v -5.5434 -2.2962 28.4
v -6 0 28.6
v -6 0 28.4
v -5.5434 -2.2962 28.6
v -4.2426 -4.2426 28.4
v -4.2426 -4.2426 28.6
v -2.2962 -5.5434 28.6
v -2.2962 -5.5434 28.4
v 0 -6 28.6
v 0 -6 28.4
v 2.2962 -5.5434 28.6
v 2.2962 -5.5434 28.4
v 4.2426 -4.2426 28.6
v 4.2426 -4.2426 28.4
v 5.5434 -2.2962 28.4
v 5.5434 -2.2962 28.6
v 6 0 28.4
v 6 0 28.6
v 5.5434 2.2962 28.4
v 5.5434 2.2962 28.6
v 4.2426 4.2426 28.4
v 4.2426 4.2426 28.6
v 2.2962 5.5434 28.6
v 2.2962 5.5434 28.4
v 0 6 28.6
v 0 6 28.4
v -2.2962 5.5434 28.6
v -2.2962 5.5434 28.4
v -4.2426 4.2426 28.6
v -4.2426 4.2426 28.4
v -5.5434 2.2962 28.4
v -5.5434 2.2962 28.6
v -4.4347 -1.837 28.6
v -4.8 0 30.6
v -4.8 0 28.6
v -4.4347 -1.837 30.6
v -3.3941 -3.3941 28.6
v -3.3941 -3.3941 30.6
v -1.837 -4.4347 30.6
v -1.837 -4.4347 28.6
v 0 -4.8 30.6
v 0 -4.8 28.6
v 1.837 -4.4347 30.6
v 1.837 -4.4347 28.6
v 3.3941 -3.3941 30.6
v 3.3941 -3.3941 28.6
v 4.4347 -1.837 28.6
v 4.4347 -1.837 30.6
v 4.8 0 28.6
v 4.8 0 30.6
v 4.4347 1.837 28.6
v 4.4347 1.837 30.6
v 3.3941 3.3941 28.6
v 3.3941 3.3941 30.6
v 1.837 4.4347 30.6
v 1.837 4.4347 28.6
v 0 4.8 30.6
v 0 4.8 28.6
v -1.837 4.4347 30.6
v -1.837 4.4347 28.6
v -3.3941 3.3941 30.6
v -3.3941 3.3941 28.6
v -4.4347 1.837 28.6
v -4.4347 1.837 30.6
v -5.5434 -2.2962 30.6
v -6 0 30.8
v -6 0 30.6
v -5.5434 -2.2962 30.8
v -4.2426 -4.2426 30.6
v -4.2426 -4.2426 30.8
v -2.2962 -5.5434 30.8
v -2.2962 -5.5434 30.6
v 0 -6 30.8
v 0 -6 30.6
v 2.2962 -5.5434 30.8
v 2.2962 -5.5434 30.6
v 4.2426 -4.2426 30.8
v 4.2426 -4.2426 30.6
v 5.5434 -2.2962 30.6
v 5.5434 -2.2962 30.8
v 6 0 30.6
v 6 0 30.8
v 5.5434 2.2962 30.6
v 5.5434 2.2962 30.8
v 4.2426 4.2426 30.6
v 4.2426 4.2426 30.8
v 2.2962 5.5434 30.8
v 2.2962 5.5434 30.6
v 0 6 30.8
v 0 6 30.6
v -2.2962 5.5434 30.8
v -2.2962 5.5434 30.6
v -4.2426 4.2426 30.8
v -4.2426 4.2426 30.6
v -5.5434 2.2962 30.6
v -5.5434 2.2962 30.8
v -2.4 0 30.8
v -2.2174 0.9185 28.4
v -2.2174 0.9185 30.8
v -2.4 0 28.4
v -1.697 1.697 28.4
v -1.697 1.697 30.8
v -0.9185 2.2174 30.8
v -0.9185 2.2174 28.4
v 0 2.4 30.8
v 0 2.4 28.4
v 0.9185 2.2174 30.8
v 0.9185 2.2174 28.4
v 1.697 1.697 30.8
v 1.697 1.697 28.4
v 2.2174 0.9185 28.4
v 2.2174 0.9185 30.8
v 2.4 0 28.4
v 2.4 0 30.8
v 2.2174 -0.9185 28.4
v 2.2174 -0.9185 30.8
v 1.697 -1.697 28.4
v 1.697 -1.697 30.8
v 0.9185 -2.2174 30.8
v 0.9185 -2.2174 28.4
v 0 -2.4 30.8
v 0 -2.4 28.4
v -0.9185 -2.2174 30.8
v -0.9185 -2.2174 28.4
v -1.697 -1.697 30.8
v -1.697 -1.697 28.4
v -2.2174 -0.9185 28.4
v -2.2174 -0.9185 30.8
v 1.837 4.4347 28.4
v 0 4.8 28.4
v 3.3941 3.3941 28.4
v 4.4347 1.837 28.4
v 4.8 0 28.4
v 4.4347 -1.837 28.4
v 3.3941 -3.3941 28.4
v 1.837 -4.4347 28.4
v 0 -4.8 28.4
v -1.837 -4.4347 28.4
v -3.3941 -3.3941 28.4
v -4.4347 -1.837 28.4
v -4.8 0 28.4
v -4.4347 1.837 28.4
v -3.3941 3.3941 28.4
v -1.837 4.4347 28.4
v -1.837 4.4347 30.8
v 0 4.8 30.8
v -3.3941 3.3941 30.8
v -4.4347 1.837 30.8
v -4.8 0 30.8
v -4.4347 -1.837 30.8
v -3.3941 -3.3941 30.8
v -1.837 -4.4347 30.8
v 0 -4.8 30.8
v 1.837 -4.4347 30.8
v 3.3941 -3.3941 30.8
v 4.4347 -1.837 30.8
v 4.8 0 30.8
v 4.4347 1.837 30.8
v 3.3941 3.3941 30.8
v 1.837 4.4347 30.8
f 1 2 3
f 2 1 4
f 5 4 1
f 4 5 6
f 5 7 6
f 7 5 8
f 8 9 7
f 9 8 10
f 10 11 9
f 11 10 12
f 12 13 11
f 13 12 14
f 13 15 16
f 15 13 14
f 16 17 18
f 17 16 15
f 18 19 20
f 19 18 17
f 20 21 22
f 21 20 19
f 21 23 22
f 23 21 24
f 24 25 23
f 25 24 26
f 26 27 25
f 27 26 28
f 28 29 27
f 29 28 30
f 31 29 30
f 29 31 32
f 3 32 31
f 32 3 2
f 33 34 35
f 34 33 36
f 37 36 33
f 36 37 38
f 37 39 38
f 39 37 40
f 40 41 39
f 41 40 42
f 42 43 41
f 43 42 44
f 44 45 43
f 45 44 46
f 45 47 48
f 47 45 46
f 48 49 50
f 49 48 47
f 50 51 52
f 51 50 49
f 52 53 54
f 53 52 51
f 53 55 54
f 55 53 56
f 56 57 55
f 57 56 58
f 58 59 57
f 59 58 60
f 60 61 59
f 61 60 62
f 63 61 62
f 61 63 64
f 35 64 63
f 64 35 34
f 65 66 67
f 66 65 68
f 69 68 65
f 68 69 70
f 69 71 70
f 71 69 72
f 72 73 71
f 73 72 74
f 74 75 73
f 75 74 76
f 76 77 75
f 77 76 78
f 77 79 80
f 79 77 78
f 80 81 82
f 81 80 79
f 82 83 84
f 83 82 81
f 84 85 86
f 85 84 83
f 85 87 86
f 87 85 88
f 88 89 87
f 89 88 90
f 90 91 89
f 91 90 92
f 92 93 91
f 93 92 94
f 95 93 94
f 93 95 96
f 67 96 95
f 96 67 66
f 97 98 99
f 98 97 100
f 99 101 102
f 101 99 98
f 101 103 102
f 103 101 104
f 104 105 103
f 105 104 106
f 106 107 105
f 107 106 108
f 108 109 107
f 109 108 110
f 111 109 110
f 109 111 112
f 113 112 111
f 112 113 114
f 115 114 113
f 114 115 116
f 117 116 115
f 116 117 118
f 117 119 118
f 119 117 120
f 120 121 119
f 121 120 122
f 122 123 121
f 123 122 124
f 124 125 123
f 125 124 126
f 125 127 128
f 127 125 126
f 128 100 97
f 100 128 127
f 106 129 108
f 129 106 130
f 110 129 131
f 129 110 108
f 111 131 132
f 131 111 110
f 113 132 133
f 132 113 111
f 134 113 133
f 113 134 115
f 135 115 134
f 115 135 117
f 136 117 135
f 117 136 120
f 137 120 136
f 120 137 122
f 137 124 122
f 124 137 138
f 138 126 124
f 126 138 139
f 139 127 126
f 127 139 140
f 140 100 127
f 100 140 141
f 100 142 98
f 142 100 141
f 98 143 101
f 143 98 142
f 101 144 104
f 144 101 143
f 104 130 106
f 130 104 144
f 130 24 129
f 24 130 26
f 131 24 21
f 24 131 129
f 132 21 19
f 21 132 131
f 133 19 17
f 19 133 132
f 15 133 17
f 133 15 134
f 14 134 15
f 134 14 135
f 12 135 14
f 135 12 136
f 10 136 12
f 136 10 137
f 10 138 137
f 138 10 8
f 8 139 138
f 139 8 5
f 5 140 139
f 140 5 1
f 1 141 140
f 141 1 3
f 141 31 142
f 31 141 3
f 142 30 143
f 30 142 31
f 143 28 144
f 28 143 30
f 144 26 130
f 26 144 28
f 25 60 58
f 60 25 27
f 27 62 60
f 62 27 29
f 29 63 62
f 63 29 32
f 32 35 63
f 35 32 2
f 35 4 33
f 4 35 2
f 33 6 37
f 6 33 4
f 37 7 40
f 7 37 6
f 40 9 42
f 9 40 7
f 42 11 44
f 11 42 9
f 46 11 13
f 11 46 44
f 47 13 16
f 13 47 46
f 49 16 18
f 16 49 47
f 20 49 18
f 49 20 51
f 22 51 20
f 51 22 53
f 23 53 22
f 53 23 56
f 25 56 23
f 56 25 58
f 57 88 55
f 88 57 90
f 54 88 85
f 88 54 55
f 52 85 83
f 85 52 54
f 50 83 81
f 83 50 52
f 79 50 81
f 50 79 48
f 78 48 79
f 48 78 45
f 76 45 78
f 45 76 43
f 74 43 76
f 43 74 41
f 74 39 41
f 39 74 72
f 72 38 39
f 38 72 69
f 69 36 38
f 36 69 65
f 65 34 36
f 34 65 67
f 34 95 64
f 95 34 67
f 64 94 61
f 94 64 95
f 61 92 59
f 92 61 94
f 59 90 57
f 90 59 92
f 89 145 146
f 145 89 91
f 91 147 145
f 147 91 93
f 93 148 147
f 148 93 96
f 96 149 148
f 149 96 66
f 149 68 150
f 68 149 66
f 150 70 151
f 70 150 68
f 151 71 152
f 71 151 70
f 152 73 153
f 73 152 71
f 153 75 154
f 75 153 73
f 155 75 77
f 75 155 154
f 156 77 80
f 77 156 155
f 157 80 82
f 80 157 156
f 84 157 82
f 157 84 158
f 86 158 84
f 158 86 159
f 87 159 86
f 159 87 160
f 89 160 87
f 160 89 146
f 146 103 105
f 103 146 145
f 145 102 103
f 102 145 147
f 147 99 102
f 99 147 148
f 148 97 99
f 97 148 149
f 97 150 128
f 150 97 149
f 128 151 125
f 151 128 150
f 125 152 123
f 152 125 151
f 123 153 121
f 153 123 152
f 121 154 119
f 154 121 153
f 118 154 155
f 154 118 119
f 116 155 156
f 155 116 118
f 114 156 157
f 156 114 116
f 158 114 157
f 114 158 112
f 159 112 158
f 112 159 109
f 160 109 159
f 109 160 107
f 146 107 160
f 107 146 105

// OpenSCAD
// file: ../p/4-4edge.scad
use <../lib.scad>
function ldraw_lib__4_4edge() = [
// 0 Circle 1.0
// 0 Name: 4-4edge.dat
// 0 Author: James Jessiman
// 0 !LDRAW_ORG Primitive UPDATE 2017-01
// 0 !LICENSE Licensed under CC BY 2.0 and CC BY 4.0 : see CAreadme.txt
// 
// 0 BFC CERTIFY CCW
  [0,"BFC","CERTIFY"],
  [0,"BFC","CCW"],
// 
// 0 !HISTORY 1998-12-15 [PTadmin] Official Update 1998-10
// 0 !HISTORY 2005-12-28 [PTadmin] Official Update 2005-01
// 0 !HISTORY 2007-06-24 [PTadmin] Header formatted for Contributor Agreement
// 0 !HISTORY 2008-07-01 [PTadmin] Official Update 2008-01
// 0 !HISTORY 2017-01-15 [Steffen] BFCed
// 0 !HISTORY 2017-12-30 [PTadmin] Official Update 2017-01
// 
// 
// 2 24 1 0 0 0.9239 0 0.3827
  [2,24,1,0,0,0.9239,0,0.3827],
// 2 24 0.9239 0 0.3827 0.7071 0 0.7071
  [2,24,0.9239,0,0.3827,0.7071,0,0.7071],
// 2 24 0.7071 0 0.7071 0.3827 0 0.9239
  [2,24,0.7071,0,0.7071,0.3827,0,0.9239],
// 2 24 0.3827 0 0.9239 0 0 1
  [2,24,0.3827,0,0.9239,0,0,1],
// 2 24 0 0 1 -0.3827 0 0.9239
  [2,24,0,0,1,-0.3827,0,0.9239],
// 2 24 -0.3827 0 0.9239 -0.7071 0 0.7071
  [2,24,-0.3827,0,0.9239,-0.7071,0,0.7071],
// 2 24 -0.7071 0 0.7071 -0.9239 0 0.3827
  [2,24,-0.7071,0,0.7071,-0.9239,0,0.3827],
// 2 24 -0.9239 0 0.3827 -1 0 -0
  [2,24,-0.9239,0,0.3827,-1,0,-0],
// 2 24 -1 0 -0 -0.9239 0 -0.3827
  [2,24,-1,0,-0,-0.9239,0,-0.3827],
// 2 24 -0.9239 0 -0.3827 -0.7071 0 -0.7071
  [2,24,-0.9239,0,-0.3827,-0.7071,0,-0.7071],
// 2 24 -0.7071 0 -0.7071 -0.3827 0 -0.9239
  [2,24,-0.7071,0,-0.7071,-0.3827,0,-0.9239],
// 2 24 -0.3827 0 -0.9239 0 0 -1
  [2,24,-0.3827,0,-0.9239,0,0,-1],
// 2 24 0 0 -1 0.3827 0 -0.9239
  [2,24,0,0,-1,0.3827,0,-0.9239],
// 2 24 0.3827 0 -0.9239 0.7071 0 -0.7071
  [2,24,0.3827,0,-0.9239,0.7071,0,-0.7071],
// 2 24 0.7071 0 -0.7071 0.9239 0 -0.3827
  [2,24,0.7071,0,-0.7071,0.9239,0,-0.3827],
// 2 24 0.9239 0 -0.3827 1 0 0
  [2,24,0.9239,0,-0.3827,1,0,0],
];
makepoly(ldraw_lib__4_4edge(), line=0.2);
// file: ../p/4-4cyli.scad
use <../lib.scad>
function ldraw_lib__4_4cyli() = [
// 0 Cylinder 1.0
// 0 Name: 4-4cyli.dat
// 0 Author: James Jessiman
// 0 !LDRAW_ORG Primitive UPDATE 2005-01
// 0 !LICENSE Licensed under CC BY 2.0 and CC BY 4.0 : see CAreadme.txt
// 
// 0 BFC CERTIFY CCW
  [0,"BFC","CERTIFY"],
  [0,"BFC","CCW"],
// 
// 0 !HISTORY 1998-12-15 [PTadmin] Official Update 1998-10
// 0 !HISTORY 2002-03-23 [sbliss] Added BFC statement; merged headers from files in distributions LDraw 0.27 and Complete.
// 0 !HISTORY 2002-04-25 [PTadmin] Official Update 2002-02
// 0 !HISTORY 2004-12-14 [guyvivan] BFC CCW
// 0 !HISTORY 2005-12-28 [PTadmin] Official Update 2005-01
// 0 !HISTORY 2007-06-24 [PTadmin] Header formatted for Contributor Agreement
// 0 !HISTORY 2008-07-01 [PTadmin] Official Update 2008-01
// 
// 
// 4 16 1 1 0 0.9239 1 0.3827 0.9239 0 0.3827 1 0 0
  [4,16,1,1,0,0.9239,1,0.3827,0.9239,0,0.3827,1,0,0],
// 5 24 1 0 0 1 1 0 0.9239 0 0.3827 0.9239 0 -0.3827
  [5,24,1,0,0,1,1,0,0.9239,0,0.3827,0.9239,0,-0.3827],
// 4 16 0.9239 1 0.3827 0.7071 1 0.7071 0.7071 0 0.7071 0.9239 0 0.3827
  [4,16,0.9239,1,0.3827,0.7071,1,0.7071,0.7071,0,0.7071,0.9239,0,0.3827],
// 5 24 0.9239 0 0.3827 0.9239 1 0.3827 0.7071 0 0.7071 1 0 0
  [5,24,0.9239,0,0.3827,0.9239,1,0.3827,0.7071,0,0.7071,1,0,0],
// 4 16 0.7071 1 0.7071 0.3827 1 0.9239 0.3827 0 0.9239 0.7071 0 0.7071
  [4,16,0.7071,1,0.7071,0.3827,1,0.9239,0.3827,0,0.9239,0.7071,0,0.7071],
// 5 24 0.7071 0 0.7071 0.7071 1 0.7071 0.3827 0 0.9239 0.9239 0 0.3827
  [5,24,0.7071,0,0.7071,0.7071,1,0.7071,0.3827,0,0.9239,0.9239,0,0.3827],
// 4 16 0.3827 1 0.9239 0 1 1 0 0 1 0.3827 0 0.9239
  [4,16,0.3827,1,0.9239,0,1,1,0,0,1,0.3827,0,0.9239],
// 5 24 0.3827 0 0.9239 0.3827 1 0.9239 0 0 1 0.7071 0 0.7071
  [5,24,0.3827,0,0.9239,0.3827,1,0.9239,0,0,1,0.7071,0,0.7071],
// 4 16 0 1 1 -0.3827 1 0.9239 -0.3827 0 0.9239 0 0 1
  [4,16,0,1,1,-0.3827,1,0.9239,-0.3827,0,0.9239,0,0,1],
// 5 24 0 0 1 0 1 1 -0.3827 0 0.9239 0.3827 0 0.9239
  [5,24,0,0,1,0,1,1,-0.3827,0,0.9239,0.3827,0,0.9239],
// 4 16 -0.3827 1 0.9239 -0.7071 1 0.7071 -0.7071 0 0.7071 -0.3827 0 0.9239
  [4,16,-0.3827,1,0.9239,-0.7071,1,0.7071,-0.7071,0,0.7071,-0.3827,0,0.9239],
// 5 24 -0.3827 0 0.9239 -0.3827 1 0.9239 -0.7071 0 0.7071 0 0 1
  [5,24,-0.3827,0,0.9239,-0.3827,1,0.9239,-0.7071,0,0.7071,0,0,1],
// 4 16 -0.7071 1 0.7071 -0.9239 1 0.3827 -0.9239 0 0.3827 -0.7071 0 0.7071
  [4,16,-0.7071,1,0.7071,-0.9239,1,0.3827,-0.9239,0,0.3827,-0.7071,0,0.7071],
// 5 24 -0.7071 0 0.7071 -0.7071 1 0.7071 -0.9239 0 0.3827 -0.3827 0 0.9239
  [5,24,-0.7071,0,0.7071,-0.7071,1,0.7071,-0.9239,0,0.3827,-0.3827,0,0.9239],
// 4 16 -0.9239 1 0.3827 -1 1 0 -1 0 0 -0.9239 0 0.3827
  [4,16,-0.9239,1,0.3827,-1,1,0,-1,0,0,-0.9239,0,0.3827],
// 5 24 -0.9239 0 0.3827 -0.9239 1 0.3827 -1 0 0 -0.7071 0 0.7071
  [5,24,-0.9239,0,0.3827,-0.9239,1,0.3827,-1,0,0,-0.7071,0,0.7071],
// 4 16 -1 1 0 -0.9239 1 -0.3827 -0.9239 0 -0.3827 -1 0 0
  [4,16,-1,1,0,-0.9239,1,-0.3827,-0.9239,0,-0.3827,-1,0,0],
// 5 24 -1 0 0 -1 1 0 -0.9239 0 -0.3827 -0.9239 0 0.3827
  [5,24,-1,0,0,-1,1,0,-0.9239,0,-0.3827,-0.9239,0,0.3827],
// 4 16 -0.9239 1 -0.3827 -0.7071 1 -0.7071 -0.7071 0 -0.7071 -0.9239 0 -0.3827
  [4,16,-0.9239,1,-0.3827,-0.7071,1,-0.7071,-0.7071,0,-0.7071,-0.9239,0,-0.3827],
// 5 24 -0.9239 0 -0.3827 -0.9239 1 -0.3827 -0.7071 0 -0.7071 -1 0 0
  [5,24,-0.9239,0,-0.3827,-0.9239,1,-0.3827,-0.7071,0,-0.7071,-1,0,0],
// 4 16 -0.7071 1 -0.7071 -0.3827 1 -0.9239 -0.3827 0 -0.9239 -0.7071 0 -0.7071
  [4,16,-0.7071,1,-0.7071,-0.3827,1,-0.9239,-0.3827,0,-0.9239,-0.7071,0,-0.7071],
// 5 24 -0.7071 0 -0.7071 -0.7071 1 -0.7071 -0.3827 0 -0.9239 -0.9239 0 -0.3827
  [5,24,-0.7071,0,-0.7071,-0.7071,1,-0.7071,-0.3827,0,-0.9239,-0.9239,0,-0.3827],
// 4 16 -0.3827 1 -0.9239 0 1 -1 0 0 -1 -0.3827 0 -0.9239
  [4,16,-0.3827,1,-0.9239,0,1,-1,0,0,-1,-0.3827,0,-0.9239],
// 5 24 -0.3827 0 -0.9239 -0.3827 1 -0.9239 0 0 -1 -0.7071 0 -0.7071
  [5,24,-0.3827,0,-0.9239,-0.3827,1,-0.9239,0,0,-1,-0.7071,0,-0.7071],
// 4 16 0 1 -1 0.3827 1 -0.9239 0.3827 0 -0.9239 0 0 -1
  [4,16,0,1,-1,0.3827,1,-0.9239,0.3827,0,-0.9239,0,0,-1],
// 5 24 0 0 -1 0 1 -1 0.3827 0 -0.9239 -0.3827 0 -0.9239
  [5,24,0,0,-1,0,1,-1,0.3827,0,-0.9239,-0.3827,0,-0.9239],
// 4 16 0.3827 1 -0.9239 0.7071 1 -0.7071 0.7071 0 -0.7071 0.3827 0 -0.9239
  [4,16,0.3827,1,-0.9239,0.7071,1,-0.7071,0.7071,0,-0.7071,0.3827,0,-0.9239],
// 5 24 0.3827 0 -0.9239 0.3827 1 -0.9239 0.7071 0 -0.7071 0 0 -1
  [5,24,0.3827,0,-0.9239,0.3827,1,-0.9239,0.7071,0,-0.7071,0,0,-1],
// 4 16 0.7071 1 -0.7071 0.9239 1 -0.3827 0.9239 0 -0.3827 0.7071 0 -0.7071
  [4,16,0.7071,1,-0.7071,0.9239,1,-0.3827,0.9239,0,-0.3827,0.7071,0,-0.7071],
// 5 24 0.7071 0 -0.7071 0.7071 1 -0.7071 0.9239 0 -0.3827 0.3827 0 -0.9239
  [5,24,0.7071,0,-0.7071,0.7071,1,-0.7071,0.9239,0,-0.3827,0.3827,0,-0.9239],
// 4 16 0.9239 1 -0.3827 1 1 0 1 0 0 0.9239 0 -0.3827
  [4,16,0.9239,1,-0.3827,1,1,0,1,0,0,0.9239,0,-0.3827],
// 5 24 0.9239 0 -0.3827 0.9239 1 -0.3827 1 0 0 0.7071 0 -0.7071
  [5,24,0.9239,0,-0.3827,0.9239,1,-0.3827,1,0,0,0.7071,0,-0.7071],
// 0
];
makepoly(ldraw_lib__4_4cyli(), line=0.2);
// file: ../p/4-4ring4.scad
use <../lib.scad>
function ldraw_lib__4_4ring4() = [
// 0 Ring  4 x 1.0
// 0 Name: 4-4ring4.dat
// 0 Author: James Jessiman
// 0 !LDRAW_ORG Primitive UPDATE 2009-01
// 0 !LICENSE Licensed under CC BY 2.0 and CC BY 4.0 : see CAreadme.txt
// 
// 0 BFC CERTIFY CCW
  [0,"BFC","CERTIFY"],
  [0,"BFC","CCW"],
// 
// 0 !HISTORY 1998-12-15 [PTadmin] Official Update 1998-10
// 0 !HISTORY 2002-04-08 [BrickCaster] Modified for BFC compliance
// 0 !HISTORY 2002-04-25 [PTadmin] Official Update 2002-02
// 0 !HISTORY 2007-06-24 [PTadmin] Header formatted for Contributor Agreement
// 0 !HISTORY 2008-07-01 [PTadmin] Official Update 2008-01
// 0 !HISTORY 2008-08-26 [cwdee] Switch polygon winding and rename
// 0 !HISTORY 2009-05-02 [PTadmin] Official Update 2009-01
// 
// 
// 4 16 -1.9135 0 4.6195 -1.5308 0 3.6956 0 0 4 0 0 5
  [4,16,-1.9135,0,4.6195,-1.5308,0,3.6956,0,0,4,0,0,5],
// 4 16 -3.5355 0 3.5355 -2.8284 0 2.8284 -1.5308 0 3.6956 -1.9135 0 4.6195
  [4,16,-3.5355,0,3.5355,-2.8284,0,2.8284,-1.5308,0,3.6956,-1.9135,0,4.6195],
// 4 16 -4.6195 0 1.9135 -3.6956 0 1.5308 -2.8284 0 2.8284 -3.5355 0 3.5355
  [4,16,-4.6195,0,1.9135,-3.6956,0,1.5308,-2.8284,0,2.8284,-3.5355,0,3.5355],
// 4 16 -5 0 0 -4 0 0 -3.6956 0 1.5308 -4.6195 0 1.9135
  [4,16,-5,0,0,-4,0,0,-3.6956,0,1.5308,-4.6195,0,1.9135],
// 4 16 -4.6195 0 -1.9135 -3.6956 0 -1.5308 -4 0 0 -5 0 0
  [4,16,-4.6195,0,-1.9135,-3.6956,0,-1.5308,-4,0,0,-5,0,0],
// 4 16 -3.5355 0 -3.5355 -2.8284 0 -2.8284 -3.6956 0 -1.5308 -4.6195 0 -1.9135
  [4,16,-3.5355,0,-3.5355,-2.8284,0,-2.8284,-3.6956,0,-1.5308,-4.6195,0,-1.9135],
// 4 16 -1.9135 0 -4.6195 -1.5308 0 -3.6956 -2.8284 0 -2.8284 -3.5355 0 -3.5355
  [4,16,-1.9135,0,-4.6195,-1.5308,0,-3.6956,-2.8284,0,-2.8284,-3.5355,0,-3.5355],
// 4 16 0 0 -5 0 0 -4 -1.5308 0 -3.6956 -1.9135 0 -4.6195
  [4,16,0,0,-5,0,0,-4,-1.5308,0,-3.6956,-1.9135,0,-4.6195],
// 4 16 1.9135 0 -4.6195 1.5308 0 -3.6956 0 0 -4 0 0 -5
  [4,16,1.9135,0,-4.6195,1.5308,0,-3.6956,0,0,-4,0,0,-5],
// 4 16 3.5355 0 -3.5355 2.8284 0 -2.8284 1.5308 0 -3.6956 1.9135 0 -4.6195
  [4,16,3.5355,0,-3.5355,2.8284,0,-2.8284,1.5308,0,-3.6956,1.9135,0,-4.6195],
// 4 16 4.6195 0 -1.9135 3.6956 0 -1.5308 2.8284 0 -2.8284 3.5355 0 -3.5355
  [4,16,4.6195,0,-1.9135,3.6956,0,-1.5308,2.8284,0,-2.8284,3.5355,0,-3.5355],
// 4 16 5 0 0 4 0 0 3.6956 0 -1.5308 4.6195 0 -1.9135
  [4,16,5,0,0,4,0,0,3.6956,0,-1.5308,4.6195,0,-1.9135],
// 4 16 4.6195 0 1.9135 3.6956 0 1.5308 4 0 0 5 0 0
  [4,16,4.6195,0,1.9135,3.6956,0,1.5308,4,0,0,5,0,0],
// 4 16 3.5355 0 3.5355 2.8284 0 2.8284 3.6956 0 1.5308 4.6195 0 1.9135
  [4,16,3.5355,0,3.5355,2.8284,0,2.8284,3.6956,0,1.5308,4.6195,0,1.9135],
// 4 16 1.9135 0 4.6195 1.5308 0 3.6956 2.8284 0 2.8284 3.5355 0 3.5355
  [4,16,1.9135,0,4.6195,1.5308,0,3.6956,2.8284,0,2.8284,3.5355,0,3.5355],
// 4 16 0 0 5 0 0 4 1.5308 0 3.6956 1.9135 0 4.6195
  [4,16,0,0,5,0,0,4,1.5308,0,3.6956,1.9135,0,4.6195],
// 0
];
makepoly(ldraw_lib__4_4ring4(), line=0.2);
// file: ../p/4-4ring1.scad
use <../lib.scad>
function ldraw_lib__4_4ring1() = [
// 0 Ring  1 x 1.0
// 0 Name: 4-4ring1.dat
// 0 Author: James Jessiman
// 0 !LDRAW_ORG Primitive UPDATE 2009-01
// 0 !LICENSE Licensed under CC BY 2.0 and CC BY 4.0 : see CAreadme.txt
// 
// 0 BFC CERTIFY CCW
  [0,"BFC","CERTIFY"],
  [0,"BFC","CCW"],
// 
// 0 !HISTORY 1998-12-15 [PTadmin] Official Update 1998-10
// 0 !HISTORY 2002-04-08 [BrickCaster] Modified for BFC compliance
// 0 !HISTORY 2002-04-25 [PTadmin] Official Update 2002-02
// 0 !HISTORY 2007-06-24 [PTadmin] Header formatted for Contributor Agreement
// 0 !HISTORY 2008-07-01 [PTadmin] Official Update 2008-01
// 0 !HISTORY 2008-08-26 [cwdee] Switch polygon winding and rename
// 0 !HISTORY 2009-05-02 [PTadmin] Official Update 2009-01
// 
// 
// 4 16 -0.7654 0 1.8478 -0.3827 0 0.9239 0 0 1 0 0 2
  [4,16,-0.7654,0,1.8478,-0.3827,0,0.9239,0,0,1,0,0,2],
// 4 16 -1.4142 0 1.4142 -0.7071 0 0.7071 -0.3827 0 0.9239 -0.7654 0 1.8478
  [4,16,-1.4142,0,1.4142,-0.7071,0,0.7071,-0.3827,0,0.9239,-0.7654,0,1.8478],
// 4 16 -1.8478 0 0.7654 -0.9239 0 0.3827 -0.7071 0 0.7071 -1.4142 0 1.41420
  [4,16,-1.8478,0,0.7654,-0.9239,0,0.3827,-0.7071,0,0.7071,-1.4142,0,1.41420],
// 4 16 -2 0 0 -1 0 0 -0.9239 0 0.3827 -1.8478 0 0.7654
  [4,16,-2,0,0,-1,0,0,-0.9239,0,0.3827,-1.8478,0,0.7654],
// 4 16 -1.8478 0 -0.7654 -0.9239 0 -0.3827 -1 0 0 -2 0 0
  [4,16,-1.8478,0,-0.7654,-0.9239,0,-0.3827,-1,0,0,-2,0,0],
// 4 16 -1.4142 0 -1.4142 -0.7071 0 -0.7071 -0.9239 0 -0.3827 -1.8478 0 -0.7654
  [4,16,-1.4142,0,-1.4142,-0.7071,0,-0.7071,-0.9239,0,-0.3827,-1.8478,0,-0.7654],
// 4 16 -0.7654 0 -1.8478 -0.3827 0 -0.9239 -0.7071 0 -0.7071 -1.4142 0 -1.4142
  [4,16,-0.7654,0,-1.8478,-0.3827,0,-0.9239,-0.7071,0,-0.7071,-1.4142,0,-1.4142],
// 4 16 0 0 -2 0 0 -1 -0.3827 0 -0.9239 -0.7654 0 -1.8478
  [4,16,0,0,-2,0,0,-1,-0.3827,0,-0.9239,-0.7654,0,-1.8478],
// 4 16 0.7654 0 -1.8478 0.3827 0 -0.9239 0 0 -1 0 0 -2
  [4,16,0.7654,0,-1.8478,0.3827,0,-0.9239,0,0,-1,0,0,-2],
// 4 16 1.4142 0 -1.4142 0.7071 0 -0.7071 0.3827 0 -0.9239 0.7654 0 -1.8478
  [4,16,1.4142,0,-1.4142,0.7071,0,-0.7071,0.3827,0,-0.9239,0.7654,0,-1.8478],
// 4 16 1.8478 0 -0.7654 0.9239 0 -0.3827 0.7071 0 -0.7071 1.4142 0 -1.4142
  [4,16,1.8478,0,-0.7654,0.9239,0,-0.3827,0.7071,0,-0.7071,1.4142,0,-1.4142],
// 4 16 2 0 0 1 0 0 0.9239 0 -0.3827 1.8478 0 -0.7654
  [4,16,2,0,0,1,0,0,0.9239,0,-0.3827,1.8478,0,-0.7654],
// 4 16 1.8478 0 0.7654 0.9239 0 0.3827 1 0 0 2 0 0
  [4,16,1.8478,0,0.7654,0.9239,0,0.3827,1,0,0,2,0,0],
// 4 16 1.4142 0 1.4142 0.7071 0 0.7071 0.9239 0 0.3827 1.8478 0 0.7654
  [4,16,1.4142,0,1.4142,0.7071,0,0.7071,0.9239,0,0.3827,1.8478,0,0.7654],
// 4 16 0.7654 0 1.8478 0.3827 0 0.9239 0.7071 0 0.7071 1.4142 0 1.4142
  [4,16,0.7654,0,1.8478,0.3827,0,0.9239,0.7071,0,0.7071,1.4142,0,1.4142],
// 4 16 0 0 2 0 0 1 0.3827 0 0.9239 0.7654 0 1.8478
  [4,16,0,0,2,0,0,1,0.3827,0,0.9239,0.7654,0,1.8478],
// 0
];
makepoly(ldraw_lib__4_4ring1(), line=0.2);
// file: ../p/4-4cylo.scad
use <../lib.scad>
use <4-4cyli.scad>
use <4-4edge.scad>
function ldraw_lib__4_4cylo() = [
// 0 Cylinder Open 1.0
// 0 Name: 4-4cylo.dat
// 0 Author: Mark Kennedy [mkennedy]
// 0 !LDRAW_ORG Primitive UPDATE 2010-01
// 0 !LICENSE Licensed under CC BY 2.0 and CC BY 4.0 : see CAreadme.txt
// 
// 0 BFC CERTIFY CCW
  [0,"BFC","CERTIFY"],
  [0,"BFC","CCW"],
// 
// 0 !HISTORY 2010-04-05 [PTadmin] Official Update 2010-01
// 
// 
// 1 16 0 0 0 1 0 0 0 1 0 0 0 1 4-4edge.dat
  [1,16,0,0,0,1,0,0,0,1,0,0,0,1, ldraw_lib__4_4edge()],
// 1 16 0 1 0 1 0 0 0 1 0 0 0 1 4-4edge.dat
  [1,16,0,1,0,1,0,0,0,1,0,0,0,1, ldraw_lib__4_4edge()],
// 1 16 0 0 0 1 0 0 0 1 0 0 0 1 4-4cyli.dat
  [1,16,0,0,0,1,0,0,0,1,0,0,0,1, ldraw_lib__4_4cyli()],
// 0
];
makepoly(ldraw_lib__4_4cylo(), line=0.2);
// main file
use <../lib.scad>
use <../p/4-4cylo.scad>
use <../p/4-4ring1.scad>
use <../p/4-4ring4.scad>
function ldraw_lib__32040() = [
// 0 ~Technic Shock Absorber 10L Damped, Gasket
// 0 Name: 32040.dat
// 0 Author: Marc Klein [marckl]
// 0 !LDRAW_ORG Part UPDATE 2013-01
// 0 !LICENSE Licensed under CC BY 2.0 and CC BY 4.0 : see CAreadme.txt
// 
// 0 BFC CERTIFY CCW
  [0,"BFC","CERTIFY"],
  [0,"BFC","CCW"],
// 
// 0 !HISTORY 2000-09-30 [PTadmin] Official Update 2000-02
// 0 !HISTORY 2007-06-25 [PTadmin] Header formatted for Contributor Agreement
// 0 !HISTORY 2008-07-01 [PTadmin] Official Update 2008-01
// 0 !HISTORY 2013-03-15 [MagFors] Modified with WINDZ for BFC compliance
// 0 !HISTORY 2013-03-15 [MagFors] Reduced filesize by using more primitives
// 0 !HISTORY 2013-07-21 [PTadmin] Official Update 2013-01
// 
// 
// 1 16 0 -71.5 0 -15 0 0 0 0.5 0 0 0 -15 4-4cylo.dat
  [1,16,0,-71.5,0,-15,0,0,0,0.5,0,0,0,-15, ldraw_lib__4_4cylo()],
// 1 16 0 -76.5 0 -12 0 0 0 5 0 0 0 -12 4-4cylo.dat
  [1,16,0,-76.5,0,-12,0,0,0,5,0,0,0,-12, ldraw_lib__4_4cylo()],
// 1 16 0 -77 0 -15 0 0 0 0.5 0 0 0 -15 4-4cylo.dat
  [1,16,0,-77,0,-15,0,0,0,0.5,0,0,0,-15, ldraw_lib__4_4cylo()],
// 0 BFC INVERTNEXT
  [0,"BFC","INVERTNEXT"],
// 1 16 0 -71 0 -6 0 0 0 -6 0 0 0 6 4-4cylo.dat
  [1,16,0,-71,0,-6,0,0,0,-6,0,0,0,6, ldraw_lib__4_4cylo()],
// 1 16 0 -71 0 -6 0 0 0 -1 0 0 0 6 4-4ring1.dat
  [1,16,0,-71,0,-6,0,0,0,-1,0,0,0,6, ldraw_lib__4_4ring1()],
// 1 16 0 -71 0 -3 0 0 0 -1 0 0 0 3 4-4ring4.dat
  [1,16,0,-71,0,-3,0,0,0,-1,0,0,0,3, ldraw_lib__4_4ring4()],
// 1 16 0 -71.5 0 3 0 0 0 1 0 0 0 3 4-4ring4.dat
  [1,16,0,-71.5,0,3,0,0,0,1,0,0,0,3, ldraw_lib__4_4ring4()],
// 1 16 0 -76.5 0 -3 0 0 0 -1 0 0 0 3 4-4ring4.dat
  [1,16,0,-76.5,0,-3,0,0,0,-1,0,0,0,3, ldraw_lib__4_4ring4()],
// 1 16 0 -77 0 3 0 0 0 1 0 0 0 3 4-4ring4.dat
  [1,16,0,-77,0,3,0,0,0,1,0,0,0,3, ldraw_lib__4_4ring4()],
// 1 16 0 -77 0 6 0 0 0 1 0 0 0 6 4-4ring1.dat
  [1,16,0,-77,0,6,0,0,0,1,0,0,0,6, ldraw_lib__4_4ring1()],
// 
];
makepoly(ldraw_lib__32040(), line=0.2);
